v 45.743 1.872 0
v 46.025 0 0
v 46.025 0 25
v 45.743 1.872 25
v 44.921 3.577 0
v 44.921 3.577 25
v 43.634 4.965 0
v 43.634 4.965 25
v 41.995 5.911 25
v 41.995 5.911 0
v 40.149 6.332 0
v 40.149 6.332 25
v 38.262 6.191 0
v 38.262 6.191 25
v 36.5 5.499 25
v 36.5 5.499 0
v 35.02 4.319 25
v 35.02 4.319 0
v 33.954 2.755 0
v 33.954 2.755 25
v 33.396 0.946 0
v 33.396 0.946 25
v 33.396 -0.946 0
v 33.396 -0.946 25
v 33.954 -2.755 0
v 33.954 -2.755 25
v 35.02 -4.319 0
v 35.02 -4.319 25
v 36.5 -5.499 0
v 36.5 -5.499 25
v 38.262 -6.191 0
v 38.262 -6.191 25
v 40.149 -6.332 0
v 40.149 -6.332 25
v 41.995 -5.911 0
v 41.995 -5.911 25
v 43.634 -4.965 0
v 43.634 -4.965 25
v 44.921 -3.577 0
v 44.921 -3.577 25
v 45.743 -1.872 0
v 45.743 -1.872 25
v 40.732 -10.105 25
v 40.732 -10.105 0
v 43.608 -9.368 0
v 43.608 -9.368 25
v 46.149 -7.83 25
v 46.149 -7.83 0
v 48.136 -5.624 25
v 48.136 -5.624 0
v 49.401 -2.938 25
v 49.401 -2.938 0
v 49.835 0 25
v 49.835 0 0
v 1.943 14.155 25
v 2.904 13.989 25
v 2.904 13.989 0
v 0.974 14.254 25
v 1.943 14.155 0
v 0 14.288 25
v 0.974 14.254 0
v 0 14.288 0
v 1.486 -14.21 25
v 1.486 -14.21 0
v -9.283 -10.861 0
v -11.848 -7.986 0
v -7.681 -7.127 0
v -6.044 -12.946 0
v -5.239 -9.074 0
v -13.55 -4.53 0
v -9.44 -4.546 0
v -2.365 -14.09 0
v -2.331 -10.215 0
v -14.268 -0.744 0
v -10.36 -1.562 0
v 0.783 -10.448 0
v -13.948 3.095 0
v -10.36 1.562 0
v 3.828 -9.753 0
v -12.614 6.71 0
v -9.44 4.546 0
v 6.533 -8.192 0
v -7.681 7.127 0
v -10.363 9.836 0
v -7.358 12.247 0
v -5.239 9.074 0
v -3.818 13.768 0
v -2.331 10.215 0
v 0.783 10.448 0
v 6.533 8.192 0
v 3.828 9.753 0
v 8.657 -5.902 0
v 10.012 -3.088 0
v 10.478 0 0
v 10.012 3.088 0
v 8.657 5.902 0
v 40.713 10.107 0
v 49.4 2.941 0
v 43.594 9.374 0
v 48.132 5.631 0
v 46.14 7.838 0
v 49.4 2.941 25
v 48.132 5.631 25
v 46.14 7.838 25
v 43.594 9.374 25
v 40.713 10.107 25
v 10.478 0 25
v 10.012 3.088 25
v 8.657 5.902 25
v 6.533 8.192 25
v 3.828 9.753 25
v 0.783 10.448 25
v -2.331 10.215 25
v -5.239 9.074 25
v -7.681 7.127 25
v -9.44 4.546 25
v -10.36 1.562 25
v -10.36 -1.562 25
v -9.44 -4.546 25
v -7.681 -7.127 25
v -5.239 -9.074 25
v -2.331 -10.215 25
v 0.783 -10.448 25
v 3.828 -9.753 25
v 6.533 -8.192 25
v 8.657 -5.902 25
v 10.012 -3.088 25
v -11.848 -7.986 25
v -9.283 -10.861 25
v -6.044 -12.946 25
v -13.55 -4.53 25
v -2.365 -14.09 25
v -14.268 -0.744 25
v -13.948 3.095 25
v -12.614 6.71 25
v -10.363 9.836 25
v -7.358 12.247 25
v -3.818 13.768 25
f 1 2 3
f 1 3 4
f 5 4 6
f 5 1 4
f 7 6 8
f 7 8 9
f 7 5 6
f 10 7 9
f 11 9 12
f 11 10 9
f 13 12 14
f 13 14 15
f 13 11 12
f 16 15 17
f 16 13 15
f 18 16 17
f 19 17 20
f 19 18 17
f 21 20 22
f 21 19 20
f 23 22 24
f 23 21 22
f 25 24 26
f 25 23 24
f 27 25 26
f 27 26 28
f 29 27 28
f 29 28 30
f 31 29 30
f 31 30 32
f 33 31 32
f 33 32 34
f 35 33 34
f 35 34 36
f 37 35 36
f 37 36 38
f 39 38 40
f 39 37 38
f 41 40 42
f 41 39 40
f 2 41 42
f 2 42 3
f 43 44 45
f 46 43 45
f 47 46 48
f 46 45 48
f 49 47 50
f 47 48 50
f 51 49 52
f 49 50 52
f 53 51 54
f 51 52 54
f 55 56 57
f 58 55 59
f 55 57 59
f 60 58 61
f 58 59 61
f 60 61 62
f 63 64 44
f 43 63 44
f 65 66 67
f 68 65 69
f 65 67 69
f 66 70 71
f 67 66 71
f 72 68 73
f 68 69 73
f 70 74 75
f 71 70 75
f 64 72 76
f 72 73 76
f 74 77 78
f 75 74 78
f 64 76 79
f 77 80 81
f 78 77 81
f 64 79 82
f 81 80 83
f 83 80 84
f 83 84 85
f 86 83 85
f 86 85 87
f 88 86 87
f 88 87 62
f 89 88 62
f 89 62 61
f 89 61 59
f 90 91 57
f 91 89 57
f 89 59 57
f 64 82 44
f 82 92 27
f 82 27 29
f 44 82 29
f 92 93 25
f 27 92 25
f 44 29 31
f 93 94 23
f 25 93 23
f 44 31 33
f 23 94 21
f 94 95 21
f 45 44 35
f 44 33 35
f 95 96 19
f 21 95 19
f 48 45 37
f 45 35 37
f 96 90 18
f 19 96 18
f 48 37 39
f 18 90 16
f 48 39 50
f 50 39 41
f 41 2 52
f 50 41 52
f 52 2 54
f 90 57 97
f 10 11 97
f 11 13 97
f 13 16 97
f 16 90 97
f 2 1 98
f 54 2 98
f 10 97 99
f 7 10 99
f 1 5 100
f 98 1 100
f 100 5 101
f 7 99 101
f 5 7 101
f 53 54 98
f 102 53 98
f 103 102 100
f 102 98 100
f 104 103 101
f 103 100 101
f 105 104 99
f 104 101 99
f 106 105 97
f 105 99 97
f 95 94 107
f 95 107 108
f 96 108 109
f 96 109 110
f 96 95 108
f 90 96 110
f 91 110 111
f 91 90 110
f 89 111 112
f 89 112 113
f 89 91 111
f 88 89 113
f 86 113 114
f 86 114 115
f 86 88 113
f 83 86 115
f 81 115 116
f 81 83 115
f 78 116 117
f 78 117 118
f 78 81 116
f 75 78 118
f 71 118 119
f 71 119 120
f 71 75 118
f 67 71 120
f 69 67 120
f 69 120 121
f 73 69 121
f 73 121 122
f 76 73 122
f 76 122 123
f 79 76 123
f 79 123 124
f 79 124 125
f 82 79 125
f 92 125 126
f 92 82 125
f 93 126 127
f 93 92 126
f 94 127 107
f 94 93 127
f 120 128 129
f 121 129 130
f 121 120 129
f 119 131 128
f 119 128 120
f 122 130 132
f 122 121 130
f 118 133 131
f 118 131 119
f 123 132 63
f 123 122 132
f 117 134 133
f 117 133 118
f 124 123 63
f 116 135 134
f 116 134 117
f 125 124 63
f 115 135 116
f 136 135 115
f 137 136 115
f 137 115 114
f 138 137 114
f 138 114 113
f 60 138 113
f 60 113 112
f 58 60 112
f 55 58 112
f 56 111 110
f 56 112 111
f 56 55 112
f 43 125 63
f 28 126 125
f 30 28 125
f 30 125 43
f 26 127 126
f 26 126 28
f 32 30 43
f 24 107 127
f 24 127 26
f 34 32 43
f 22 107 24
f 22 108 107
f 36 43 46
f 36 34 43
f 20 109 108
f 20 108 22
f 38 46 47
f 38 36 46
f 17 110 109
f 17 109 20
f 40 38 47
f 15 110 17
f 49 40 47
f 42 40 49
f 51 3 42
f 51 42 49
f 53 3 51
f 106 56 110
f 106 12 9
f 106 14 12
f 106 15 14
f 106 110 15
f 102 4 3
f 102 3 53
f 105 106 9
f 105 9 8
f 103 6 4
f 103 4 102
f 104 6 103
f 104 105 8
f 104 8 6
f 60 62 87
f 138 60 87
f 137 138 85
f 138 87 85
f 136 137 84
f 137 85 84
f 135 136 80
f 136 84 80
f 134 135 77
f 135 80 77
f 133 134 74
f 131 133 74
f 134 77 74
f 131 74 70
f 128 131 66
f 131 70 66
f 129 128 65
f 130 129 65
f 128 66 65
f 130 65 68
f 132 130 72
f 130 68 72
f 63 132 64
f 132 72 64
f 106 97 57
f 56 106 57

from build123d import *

# Parameters (mm, degrees)
F0_R     = 10.4775
F0_R_2   = 6.35
F1_DEPTH = 25


with BuildPart() as f1:
    # F0 (on Top) → F1 (new body)
    with BuildSketch(Plane.XY):
        with BuildLine():
            Line((2.903655, 13.989333), (0, 14.2875))
            ThreePointArc((0, 14.2875), (-14.268105, -0.744198), (1.486376, -14.209973))
            ThreePointArc((1.486376, -14.209973), (10.615301, -9.562846), (14.2875, 0))
            ThreePointArc((14.2875, 0), (11.081936, 9.017946), (2.903655, 13.989333))
        make_face()
        Circle(F0_R, mode=Mode.SUBTRACT)
        with BuildLine():
            ThreePointArc((2.903655, 13.989333), (1.459462, 14.212763), (0, 14.2875))
            Line((0, 14.2875), (2.903655, 13.989333))
        make_face()
        with BuildLine():
            ThreePointArc((14.2875, 0), (10.615301, -9.562846), (1.486376, -14.209973))
            Line((1.486376, -14.209973), (40.731778, -10.10487))
            ThreePointArc((40.731778, -10.10487), (29.514805, -0.009621), (40.712639, 10.106854))
            Line((40.712639, 10.106854), (2.903655, 13.989333))
            ThreePointArc((2.903655, 13.989333), (11.081936, 9.017946), (14.2875, 0))
        make_face()
        with BuildLine():
            ThreePointArc((40.712639, 10.106854), (29.514805, -0.009621), (40.731778, -10.10487))
            ThreePointArc((40.731778, -10.10487), (47.223459, -6.800246), (49.8348, 0))
            ThreePointArc((49.8348, 0), (47.217016, 6.807391), (40.712639, 10.106854))
        make_face()
        with Locations((39.6748, 0)):
            Circle(F0_R_2, mode=Mode.SUBTRACT)
    extrude(amount=F1_DEPTH)


solid = f1.part
